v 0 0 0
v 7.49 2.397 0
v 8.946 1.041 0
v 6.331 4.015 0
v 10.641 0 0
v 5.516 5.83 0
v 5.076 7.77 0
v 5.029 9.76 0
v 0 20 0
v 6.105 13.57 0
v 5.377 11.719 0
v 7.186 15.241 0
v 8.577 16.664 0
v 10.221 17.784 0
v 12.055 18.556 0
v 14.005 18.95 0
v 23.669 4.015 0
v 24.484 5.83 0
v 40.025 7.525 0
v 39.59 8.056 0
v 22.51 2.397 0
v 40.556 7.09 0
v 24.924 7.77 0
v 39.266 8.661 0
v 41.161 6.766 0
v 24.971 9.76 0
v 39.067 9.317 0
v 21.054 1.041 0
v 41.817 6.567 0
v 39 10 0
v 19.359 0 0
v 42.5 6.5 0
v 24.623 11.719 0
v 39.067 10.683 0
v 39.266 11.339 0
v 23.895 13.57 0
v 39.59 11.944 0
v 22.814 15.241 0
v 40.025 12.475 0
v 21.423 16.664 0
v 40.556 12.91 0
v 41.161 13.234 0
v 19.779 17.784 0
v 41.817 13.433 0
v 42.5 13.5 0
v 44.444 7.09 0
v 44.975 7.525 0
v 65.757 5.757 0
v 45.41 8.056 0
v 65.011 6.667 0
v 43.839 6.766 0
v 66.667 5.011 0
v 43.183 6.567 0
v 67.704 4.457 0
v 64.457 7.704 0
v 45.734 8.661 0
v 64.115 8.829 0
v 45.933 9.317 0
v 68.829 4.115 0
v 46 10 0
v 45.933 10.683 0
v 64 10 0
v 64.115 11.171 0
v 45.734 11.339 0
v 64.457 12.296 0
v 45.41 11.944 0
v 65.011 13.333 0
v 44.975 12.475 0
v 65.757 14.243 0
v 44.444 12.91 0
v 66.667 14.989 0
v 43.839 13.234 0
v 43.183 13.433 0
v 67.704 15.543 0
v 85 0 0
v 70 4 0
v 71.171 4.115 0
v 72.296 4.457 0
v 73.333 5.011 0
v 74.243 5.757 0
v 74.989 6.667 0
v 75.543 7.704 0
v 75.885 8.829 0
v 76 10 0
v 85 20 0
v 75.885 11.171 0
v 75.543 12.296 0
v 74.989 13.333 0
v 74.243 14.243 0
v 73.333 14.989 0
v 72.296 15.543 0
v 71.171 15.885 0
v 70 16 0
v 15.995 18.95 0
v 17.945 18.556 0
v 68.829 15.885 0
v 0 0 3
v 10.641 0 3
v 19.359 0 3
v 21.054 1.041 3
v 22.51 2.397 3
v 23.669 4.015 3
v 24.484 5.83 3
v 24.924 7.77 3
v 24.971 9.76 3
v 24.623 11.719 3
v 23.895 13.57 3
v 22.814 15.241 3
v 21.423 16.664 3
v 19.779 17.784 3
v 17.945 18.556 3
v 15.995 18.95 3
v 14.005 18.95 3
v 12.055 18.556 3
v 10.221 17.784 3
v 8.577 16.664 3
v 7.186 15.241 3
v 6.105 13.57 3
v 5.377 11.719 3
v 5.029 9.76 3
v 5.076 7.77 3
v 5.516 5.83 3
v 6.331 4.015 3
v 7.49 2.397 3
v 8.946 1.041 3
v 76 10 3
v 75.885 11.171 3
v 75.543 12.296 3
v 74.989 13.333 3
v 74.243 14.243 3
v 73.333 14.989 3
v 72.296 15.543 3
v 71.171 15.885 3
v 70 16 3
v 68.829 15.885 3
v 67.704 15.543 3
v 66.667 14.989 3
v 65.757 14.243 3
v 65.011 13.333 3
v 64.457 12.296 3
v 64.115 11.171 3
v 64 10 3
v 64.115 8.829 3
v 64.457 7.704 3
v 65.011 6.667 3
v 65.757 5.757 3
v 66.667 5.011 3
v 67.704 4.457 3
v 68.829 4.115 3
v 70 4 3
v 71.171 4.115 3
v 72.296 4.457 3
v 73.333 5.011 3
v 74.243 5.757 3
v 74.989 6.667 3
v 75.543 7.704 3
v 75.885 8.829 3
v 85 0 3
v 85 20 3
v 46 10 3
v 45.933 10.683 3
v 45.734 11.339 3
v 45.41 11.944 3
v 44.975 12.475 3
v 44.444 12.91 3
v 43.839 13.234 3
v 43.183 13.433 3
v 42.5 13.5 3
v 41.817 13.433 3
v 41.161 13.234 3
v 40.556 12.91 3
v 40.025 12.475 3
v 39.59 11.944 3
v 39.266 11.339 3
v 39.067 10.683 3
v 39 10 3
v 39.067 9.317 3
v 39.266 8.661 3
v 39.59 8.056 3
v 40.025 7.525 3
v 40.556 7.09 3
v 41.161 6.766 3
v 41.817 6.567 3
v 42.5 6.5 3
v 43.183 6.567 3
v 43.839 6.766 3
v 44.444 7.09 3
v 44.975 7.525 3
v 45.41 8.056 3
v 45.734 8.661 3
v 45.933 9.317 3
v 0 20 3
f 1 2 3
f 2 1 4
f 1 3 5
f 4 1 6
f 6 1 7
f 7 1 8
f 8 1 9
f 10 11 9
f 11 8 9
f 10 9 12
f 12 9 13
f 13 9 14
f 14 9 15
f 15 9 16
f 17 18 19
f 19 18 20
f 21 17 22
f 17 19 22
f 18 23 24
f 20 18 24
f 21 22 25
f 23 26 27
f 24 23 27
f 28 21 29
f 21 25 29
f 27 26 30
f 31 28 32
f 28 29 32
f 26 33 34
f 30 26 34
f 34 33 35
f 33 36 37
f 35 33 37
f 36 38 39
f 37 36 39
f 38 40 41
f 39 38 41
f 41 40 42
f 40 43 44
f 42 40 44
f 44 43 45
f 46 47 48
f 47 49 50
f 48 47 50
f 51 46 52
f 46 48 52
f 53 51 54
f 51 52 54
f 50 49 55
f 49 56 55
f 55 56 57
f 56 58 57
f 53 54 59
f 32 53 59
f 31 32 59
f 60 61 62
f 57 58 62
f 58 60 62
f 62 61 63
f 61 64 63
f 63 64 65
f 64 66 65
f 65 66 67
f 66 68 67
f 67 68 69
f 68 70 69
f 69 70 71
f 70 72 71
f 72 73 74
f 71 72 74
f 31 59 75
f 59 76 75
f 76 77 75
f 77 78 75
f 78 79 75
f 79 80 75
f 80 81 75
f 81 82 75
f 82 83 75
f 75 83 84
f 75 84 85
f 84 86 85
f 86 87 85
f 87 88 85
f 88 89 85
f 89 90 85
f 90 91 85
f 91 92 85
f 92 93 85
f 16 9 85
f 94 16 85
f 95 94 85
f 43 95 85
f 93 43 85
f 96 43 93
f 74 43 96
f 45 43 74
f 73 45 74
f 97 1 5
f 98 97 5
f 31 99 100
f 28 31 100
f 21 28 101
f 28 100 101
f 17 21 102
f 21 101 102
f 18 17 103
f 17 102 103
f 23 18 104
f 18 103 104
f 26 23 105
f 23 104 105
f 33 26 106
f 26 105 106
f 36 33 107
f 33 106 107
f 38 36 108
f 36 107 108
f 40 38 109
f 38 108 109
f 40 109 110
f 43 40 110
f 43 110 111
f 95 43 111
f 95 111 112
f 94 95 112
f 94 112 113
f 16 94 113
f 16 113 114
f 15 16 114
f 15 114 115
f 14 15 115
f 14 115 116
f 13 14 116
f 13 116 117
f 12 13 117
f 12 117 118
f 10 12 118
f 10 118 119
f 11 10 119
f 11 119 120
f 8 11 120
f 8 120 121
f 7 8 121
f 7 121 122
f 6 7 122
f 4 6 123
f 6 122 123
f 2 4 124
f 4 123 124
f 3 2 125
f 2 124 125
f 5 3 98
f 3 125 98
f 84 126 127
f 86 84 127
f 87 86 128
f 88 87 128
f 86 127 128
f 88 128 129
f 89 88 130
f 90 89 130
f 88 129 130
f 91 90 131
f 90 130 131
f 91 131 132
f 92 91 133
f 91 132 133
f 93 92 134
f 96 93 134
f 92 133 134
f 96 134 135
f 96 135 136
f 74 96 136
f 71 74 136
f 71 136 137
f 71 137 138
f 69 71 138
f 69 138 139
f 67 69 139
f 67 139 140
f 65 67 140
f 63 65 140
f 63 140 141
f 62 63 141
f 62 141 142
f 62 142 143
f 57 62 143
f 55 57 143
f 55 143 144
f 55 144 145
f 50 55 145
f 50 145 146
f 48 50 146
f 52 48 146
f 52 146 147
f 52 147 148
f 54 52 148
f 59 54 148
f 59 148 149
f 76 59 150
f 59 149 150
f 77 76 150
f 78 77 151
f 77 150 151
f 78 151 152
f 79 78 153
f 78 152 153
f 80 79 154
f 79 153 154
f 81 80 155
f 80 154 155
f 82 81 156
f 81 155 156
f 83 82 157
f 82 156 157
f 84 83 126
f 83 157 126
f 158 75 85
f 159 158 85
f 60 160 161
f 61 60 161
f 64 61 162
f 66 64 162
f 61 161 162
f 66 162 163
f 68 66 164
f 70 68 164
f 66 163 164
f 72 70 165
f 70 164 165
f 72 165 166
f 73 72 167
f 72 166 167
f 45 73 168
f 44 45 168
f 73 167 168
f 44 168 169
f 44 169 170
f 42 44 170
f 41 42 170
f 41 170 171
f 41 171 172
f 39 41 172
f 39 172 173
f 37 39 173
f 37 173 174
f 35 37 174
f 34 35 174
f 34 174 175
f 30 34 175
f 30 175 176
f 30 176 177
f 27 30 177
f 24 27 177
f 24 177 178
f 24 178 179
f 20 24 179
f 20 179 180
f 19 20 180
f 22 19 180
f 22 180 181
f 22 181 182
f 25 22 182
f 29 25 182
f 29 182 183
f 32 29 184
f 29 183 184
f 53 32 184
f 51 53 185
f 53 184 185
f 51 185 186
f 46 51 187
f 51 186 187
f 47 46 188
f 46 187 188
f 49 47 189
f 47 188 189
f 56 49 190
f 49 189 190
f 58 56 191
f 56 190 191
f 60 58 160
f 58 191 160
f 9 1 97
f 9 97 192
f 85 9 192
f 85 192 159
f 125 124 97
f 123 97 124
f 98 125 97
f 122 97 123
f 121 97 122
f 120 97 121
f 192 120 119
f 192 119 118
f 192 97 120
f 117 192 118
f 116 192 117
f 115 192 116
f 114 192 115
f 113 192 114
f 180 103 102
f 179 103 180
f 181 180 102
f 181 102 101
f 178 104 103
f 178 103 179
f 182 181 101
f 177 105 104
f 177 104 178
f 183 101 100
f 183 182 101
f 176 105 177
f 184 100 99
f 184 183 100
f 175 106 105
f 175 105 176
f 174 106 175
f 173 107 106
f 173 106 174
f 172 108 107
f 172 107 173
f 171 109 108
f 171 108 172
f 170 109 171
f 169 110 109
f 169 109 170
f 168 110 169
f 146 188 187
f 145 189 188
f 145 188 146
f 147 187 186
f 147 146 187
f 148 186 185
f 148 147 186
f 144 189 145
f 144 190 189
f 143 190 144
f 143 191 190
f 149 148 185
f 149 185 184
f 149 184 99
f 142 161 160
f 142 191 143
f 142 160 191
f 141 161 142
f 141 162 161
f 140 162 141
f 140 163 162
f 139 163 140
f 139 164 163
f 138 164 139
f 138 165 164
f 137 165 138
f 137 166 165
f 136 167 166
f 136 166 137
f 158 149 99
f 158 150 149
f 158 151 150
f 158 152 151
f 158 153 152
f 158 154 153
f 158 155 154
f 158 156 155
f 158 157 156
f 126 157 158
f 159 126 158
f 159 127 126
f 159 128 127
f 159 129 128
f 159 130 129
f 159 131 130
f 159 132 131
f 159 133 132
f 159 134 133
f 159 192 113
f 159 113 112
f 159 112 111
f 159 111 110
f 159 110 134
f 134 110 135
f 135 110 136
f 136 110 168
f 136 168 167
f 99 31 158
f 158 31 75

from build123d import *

# Parameters (mm, degrees)
SKETCH1_W           = 85
SKETCH1_H           = 20
BOSS_EXTRUDE1_DEPTH = 3
SKETCH2_R           = 3.5
SKETCH2_R_2         = 6
SKETCH2_R_3         = 10
CUT_EXTRUDE1_DEPTH  = 4


with BuildPart() as part:
    # Sketch1 → Boss-Extrude1 (new body)
    with BuildSketch(Plane.XY):
        with Locations((42.5, 10)):
            Rectangle(SKETCH1_W, SKETCH1_H)
    extrude(amount=BOSS_EXTRUDE1_DEPTH)

    # Sketch2 → Cut-Extrude1 (cut, through all)
    with BuildSketch(Plane.XY.offset(3)):
        with Locations((42.5, 10)):
            Circle(SKETCH2_R)
        with Locations((70, 10)):
            Circle(SKETCH2_R_2)
        with Locations((15, 9)):
            Circle(SKETCH2_R_3)
    extrude(amount=-CUT_EXTRUDE1_DEPTH, mode=Mode.SUBTRACT)


solid = part.part
